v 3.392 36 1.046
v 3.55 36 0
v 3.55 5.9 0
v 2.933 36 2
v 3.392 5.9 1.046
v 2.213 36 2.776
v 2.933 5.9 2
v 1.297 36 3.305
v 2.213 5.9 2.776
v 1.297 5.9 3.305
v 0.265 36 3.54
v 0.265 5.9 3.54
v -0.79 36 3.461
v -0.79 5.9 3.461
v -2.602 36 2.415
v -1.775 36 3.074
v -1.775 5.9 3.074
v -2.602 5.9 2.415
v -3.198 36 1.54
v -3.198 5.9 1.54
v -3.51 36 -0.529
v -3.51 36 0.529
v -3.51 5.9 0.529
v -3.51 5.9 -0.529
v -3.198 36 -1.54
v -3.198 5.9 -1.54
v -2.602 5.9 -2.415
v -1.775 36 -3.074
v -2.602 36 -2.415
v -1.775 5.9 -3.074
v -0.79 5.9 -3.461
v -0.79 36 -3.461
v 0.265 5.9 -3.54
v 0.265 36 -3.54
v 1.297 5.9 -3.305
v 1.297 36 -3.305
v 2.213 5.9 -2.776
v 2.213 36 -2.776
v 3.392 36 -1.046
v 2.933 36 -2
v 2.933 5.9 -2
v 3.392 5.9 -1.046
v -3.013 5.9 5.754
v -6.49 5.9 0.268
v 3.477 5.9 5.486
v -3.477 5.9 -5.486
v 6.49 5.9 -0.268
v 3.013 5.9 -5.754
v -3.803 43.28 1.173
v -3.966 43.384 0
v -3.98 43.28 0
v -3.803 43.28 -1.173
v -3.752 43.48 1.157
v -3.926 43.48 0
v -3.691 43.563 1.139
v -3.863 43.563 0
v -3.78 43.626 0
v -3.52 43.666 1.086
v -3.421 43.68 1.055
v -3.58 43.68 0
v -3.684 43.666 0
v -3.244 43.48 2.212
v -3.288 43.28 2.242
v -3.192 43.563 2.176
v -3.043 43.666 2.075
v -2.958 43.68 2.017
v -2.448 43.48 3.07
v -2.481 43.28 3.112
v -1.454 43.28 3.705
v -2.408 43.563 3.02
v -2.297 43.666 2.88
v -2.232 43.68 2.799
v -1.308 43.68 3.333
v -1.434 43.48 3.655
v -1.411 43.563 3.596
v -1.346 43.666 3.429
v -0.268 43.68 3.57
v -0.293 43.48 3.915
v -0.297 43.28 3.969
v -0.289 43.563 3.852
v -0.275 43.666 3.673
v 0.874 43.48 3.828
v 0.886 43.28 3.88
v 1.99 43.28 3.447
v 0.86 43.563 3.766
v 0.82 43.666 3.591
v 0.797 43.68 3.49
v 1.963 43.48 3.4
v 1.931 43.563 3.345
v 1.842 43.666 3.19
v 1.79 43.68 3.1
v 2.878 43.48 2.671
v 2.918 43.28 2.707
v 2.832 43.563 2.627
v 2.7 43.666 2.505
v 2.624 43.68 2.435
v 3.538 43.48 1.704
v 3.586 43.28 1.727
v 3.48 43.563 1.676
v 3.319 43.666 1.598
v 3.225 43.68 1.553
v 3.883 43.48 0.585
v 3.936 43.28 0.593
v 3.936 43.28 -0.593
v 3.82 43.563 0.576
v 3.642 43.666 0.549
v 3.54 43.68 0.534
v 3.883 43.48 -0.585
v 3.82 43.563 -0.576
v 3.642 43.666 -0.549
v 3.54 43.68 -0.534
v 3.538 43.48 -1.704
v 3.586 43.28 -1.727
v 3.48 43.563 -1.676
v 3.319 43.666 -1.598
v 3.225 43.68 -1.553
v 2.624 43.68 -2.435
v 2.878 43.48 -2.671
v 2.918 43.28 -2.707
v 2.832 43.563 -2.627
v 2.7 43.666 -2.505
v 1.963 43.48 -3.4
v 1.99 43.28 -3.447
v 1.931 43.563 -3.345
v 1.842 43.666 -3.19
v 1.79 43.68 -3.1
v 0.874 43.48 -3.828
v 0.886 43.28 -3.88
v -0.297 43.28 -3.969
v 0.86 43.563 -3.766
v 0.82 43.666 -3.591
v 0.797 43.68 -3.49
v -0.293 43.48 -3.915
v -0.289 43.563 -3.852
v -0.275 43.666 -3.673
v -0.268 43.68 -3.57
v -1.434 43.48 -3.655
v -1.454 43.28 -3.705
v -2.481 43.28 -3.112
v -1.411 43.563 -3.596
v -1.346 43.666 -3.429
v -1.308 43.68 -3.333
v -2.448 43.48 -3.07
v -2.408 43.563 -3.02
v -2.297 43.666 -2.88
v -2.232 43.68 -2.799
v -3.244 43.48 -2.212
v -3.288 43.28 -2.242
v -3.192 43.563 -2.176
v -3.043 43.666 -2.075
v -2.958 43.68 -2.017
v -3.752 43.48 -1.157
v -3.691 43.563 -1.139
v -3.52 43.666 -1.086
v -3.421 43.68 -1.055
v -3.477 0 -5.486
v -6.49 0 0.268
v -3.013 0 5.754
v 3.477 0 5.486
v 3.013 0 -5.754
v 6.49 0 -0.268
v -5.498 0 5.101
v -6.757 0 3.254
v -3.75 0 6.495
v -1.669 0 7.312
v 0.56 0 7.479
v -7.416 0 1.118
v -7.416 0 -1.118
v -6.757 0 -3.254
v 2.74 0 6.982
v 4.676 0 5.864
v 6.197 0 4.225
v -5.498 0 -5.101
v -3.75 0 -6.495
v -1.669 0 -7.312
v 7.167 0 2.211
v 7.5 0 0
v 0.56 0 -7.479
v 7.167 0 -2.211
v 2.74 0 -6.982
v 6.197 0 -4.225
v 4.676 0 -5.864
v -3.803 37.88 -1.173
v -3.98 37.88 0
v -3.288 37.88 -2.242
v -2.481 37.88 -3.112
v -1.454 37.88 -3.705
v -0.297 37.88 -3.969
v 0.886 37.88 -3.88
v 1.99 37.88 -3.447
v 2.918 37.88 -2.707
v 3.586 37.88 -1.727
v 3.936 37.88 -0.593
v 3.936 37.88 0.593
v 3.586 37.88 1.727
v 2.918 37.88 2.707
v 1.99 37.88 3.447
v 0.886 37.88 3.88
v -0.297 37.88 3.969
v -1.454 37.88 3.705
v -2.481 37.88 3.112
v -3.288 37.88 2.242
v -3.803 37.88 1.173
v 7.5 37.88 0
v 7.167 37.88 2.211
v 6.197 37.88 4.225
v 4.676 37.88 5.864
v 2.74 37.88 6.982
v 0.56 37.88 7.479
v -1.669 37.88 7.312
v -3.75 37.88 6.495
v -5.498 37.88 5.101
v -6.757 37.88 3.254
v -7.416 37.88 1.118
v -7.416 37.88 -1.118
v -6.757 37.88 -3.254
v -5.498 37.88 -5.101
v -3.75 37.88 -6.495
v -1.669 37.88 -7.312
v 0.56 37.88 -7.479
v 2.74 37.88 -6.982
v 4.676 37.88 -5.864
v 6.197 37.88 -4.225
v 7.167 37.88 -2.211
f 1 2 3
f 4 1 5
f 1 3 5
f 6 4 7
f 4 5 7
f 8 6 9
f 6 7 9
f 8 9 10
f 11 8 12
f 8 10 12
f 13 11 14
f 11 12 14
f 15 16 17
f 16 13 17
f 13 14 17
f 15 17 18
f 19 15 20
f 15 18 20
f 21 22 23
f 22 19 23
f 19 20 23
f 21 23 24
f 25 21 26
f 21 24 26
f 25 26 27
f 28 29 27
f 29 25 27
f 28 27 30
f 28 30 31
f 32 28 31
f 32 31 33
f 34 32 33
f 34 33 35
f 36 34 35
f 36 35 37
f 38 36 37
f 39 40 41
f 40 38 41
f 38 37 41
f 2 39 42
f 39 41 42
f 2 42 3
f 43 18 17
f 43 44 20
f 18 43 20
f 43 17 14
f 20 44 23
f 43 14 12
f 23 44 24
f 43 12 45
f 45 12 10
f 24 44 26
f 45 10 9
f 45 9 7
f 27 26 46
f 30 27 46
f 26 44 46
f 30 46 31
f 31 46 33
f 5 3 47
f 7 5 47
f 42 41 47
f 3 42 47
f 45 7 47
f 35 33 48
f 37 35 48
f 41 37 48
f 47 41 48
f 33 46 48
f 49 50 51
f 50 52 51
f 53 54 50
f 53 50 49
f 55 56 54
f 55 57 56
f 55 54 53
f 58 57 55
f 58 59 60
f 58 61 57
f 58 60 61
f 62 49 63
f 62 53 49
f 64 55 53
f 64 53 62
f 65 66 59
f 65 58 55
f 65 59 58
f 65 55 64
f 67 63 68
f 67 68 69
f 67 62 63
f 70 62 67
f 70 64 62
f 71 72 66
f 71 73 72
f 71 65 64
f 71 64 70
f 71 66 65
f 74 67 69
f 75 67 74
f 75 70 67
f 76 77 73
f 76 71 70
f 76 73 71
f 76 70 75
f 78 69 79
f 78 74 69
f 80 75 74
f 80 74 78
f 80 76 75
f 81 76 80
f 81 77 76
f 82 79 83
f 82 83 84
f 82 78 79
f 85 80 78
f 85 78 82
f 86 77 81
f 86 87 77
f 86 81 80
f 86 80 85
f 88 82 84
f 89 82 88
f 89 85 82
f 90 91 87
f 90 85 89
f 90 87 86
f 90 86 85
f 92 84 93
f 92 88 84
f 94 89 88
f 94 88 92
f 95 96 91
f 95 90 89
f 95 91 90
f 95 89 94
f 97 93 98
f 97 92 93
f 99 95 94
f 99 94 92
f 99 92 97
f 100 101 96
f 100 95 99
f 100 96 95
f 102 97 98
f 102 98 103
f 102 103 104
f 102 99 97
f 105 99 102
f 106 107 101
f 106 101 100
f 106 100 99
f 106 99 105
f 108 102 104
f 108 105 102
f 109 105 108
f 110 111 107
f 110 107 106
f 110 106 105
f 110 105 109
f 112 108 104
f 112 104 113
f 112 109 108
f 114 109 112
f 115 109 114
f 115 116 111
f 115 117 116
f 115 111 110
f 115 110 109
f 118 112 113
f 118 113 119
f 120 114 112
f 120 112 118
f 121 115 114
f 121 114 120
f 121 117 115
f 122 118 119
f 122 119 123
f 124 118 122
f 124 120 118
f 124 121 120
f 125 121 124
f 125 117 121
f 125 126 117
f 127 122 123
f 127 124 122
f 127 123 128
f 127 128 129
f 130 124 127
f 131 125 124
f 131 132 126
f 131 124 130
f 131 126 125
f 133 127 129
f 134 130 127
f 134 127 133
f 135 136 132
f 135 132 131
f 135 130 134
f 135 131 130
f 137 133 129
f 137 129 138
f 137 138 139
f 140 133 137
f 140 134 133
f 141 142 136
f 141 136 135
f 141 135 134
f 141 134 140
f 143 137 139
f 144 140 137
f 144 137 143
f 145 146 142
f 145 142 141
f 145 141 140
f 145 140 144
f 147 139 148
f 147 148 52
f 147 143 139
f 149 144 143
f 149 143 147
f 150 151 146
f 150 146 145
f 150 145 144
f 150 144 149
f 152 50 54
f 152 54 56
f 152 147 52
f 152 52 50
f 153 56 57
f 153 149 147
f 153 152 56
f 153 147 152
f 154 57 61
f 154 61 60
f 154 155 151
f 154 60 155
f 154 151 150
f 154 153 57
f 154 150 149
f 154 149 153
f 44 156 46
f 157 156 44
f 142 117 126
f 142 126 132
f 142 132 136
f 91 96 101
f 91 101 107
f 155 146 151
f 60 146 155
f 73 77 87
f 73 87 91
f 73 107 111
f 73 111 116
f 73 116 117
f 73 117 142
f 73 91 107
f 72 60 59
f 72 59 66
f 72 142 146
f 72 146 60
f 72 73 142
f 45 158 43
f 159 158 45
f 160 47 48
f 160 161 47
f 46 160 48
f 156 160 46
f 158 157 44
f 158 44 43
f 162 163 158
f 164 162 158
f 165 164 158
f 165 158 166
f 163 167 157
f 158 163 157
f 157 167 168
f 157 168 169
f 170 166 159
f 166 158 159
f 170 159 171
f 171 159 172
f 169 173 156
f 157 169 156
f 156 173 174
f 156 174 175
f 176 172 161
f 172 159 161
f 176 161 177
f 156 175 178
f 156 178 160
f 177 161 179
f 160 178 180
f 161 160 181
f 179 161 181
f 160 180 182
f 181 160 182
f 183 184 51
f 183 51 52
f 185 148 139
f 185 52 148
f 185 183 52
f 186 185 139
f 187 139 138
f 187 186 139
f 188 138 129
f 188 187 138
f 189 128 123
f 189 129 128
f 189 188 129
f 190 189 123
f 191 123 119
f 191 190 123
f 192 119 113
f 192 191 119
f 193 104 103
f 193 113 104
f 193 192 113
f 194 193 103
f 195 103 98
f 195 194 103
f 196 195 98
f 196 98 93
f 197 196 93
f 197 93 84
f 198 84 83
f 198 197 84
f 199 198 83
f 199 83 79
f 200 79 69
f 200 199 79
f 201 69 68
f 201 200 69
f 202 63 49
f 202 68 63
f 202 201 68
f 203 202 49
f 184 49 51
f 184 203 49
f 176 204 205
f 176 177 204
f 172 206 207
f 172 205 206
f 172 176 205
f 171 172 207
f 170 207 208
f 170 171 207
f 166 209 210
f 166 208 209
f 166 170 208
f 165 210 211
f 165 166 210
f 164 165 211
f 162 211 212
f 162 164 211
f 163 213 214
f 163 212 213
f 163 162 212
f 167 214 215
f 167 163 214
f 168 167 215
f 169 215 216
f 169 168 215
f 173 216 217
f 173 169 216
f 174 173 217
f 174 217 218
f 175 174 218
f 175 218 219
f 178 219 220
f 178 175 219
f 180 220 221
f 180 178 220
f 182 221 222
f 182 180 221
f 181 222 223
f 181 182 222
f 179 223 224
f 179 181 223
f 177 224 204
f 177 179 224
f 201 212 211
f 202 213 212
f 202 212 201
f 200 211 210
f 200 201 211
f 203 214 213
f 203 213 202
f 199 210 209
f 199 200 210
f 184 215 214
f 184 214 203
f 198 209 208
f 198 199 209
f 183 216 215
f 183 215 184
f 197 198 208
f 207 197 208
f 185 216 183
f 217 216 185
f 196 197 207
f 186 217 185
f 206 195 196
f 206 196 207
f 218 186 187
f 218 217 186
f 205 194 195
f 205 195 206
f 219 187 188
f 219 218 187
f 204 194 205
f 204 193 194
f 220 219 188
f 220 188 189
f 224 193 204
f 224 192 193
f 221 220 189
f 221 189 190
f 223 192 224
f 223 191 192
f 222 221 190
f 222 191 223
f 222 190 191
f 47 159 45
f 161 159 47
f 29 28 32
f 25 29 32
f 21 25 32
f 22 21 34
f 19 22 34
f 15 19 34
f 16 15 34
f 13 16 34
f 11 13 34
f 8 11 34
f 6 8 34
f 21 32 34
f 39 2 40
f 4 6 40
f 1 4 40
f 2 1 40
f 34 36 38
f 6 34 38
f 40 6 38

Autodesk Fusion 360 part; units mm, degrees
sketch "Sketch1" plane through (0, 0, 0) normal (0, 1, 0) x (1, 0, 0)
  circle A0 centre (0, 0) radius 7.5
  line L0 (6.4897, 0.2677) -> (3.013, 5.7541)
  line L1 (3.013, 5.7541) -> (-3.4767, 5.4864)
  line L2 (-3.4767, 5.4864) -> (-6.4897, -0.2677)
  line L3 (-6.4897, -0.2677) -> (-3.013, -5.7541)
  line L4 (-3.013, -5.7541) -> (3.4767, -5.4864)
  line L5 (3.4767, -5.4864) -> (6.4897, 0.2677)
  circle A1 centre (0, 0) radius 3.55
  dimension "d1" = 15
  dimension "d2" = 5.625
  dimension "d7" = 7.1
extrude "Extrude1" add sketch "Sketch1" along normal blind 37.88 contours A0 | L0 L1 L2 L3 L4 L5 | A1
extrude "Extrude2" cut sketch "Sketch1" along normal blind 5.9 contours L0 L1 L2 L3 L4 L5 | A1
extrude "Extrude3" cut sketch "Sketch1" along normal blind 36 contours A1
sketch "Sketch2" plane through (0, 37.88, 0) normal (0, 1, 0) x (-1, 0, 0)
  circle A0 centre (0, 0) radius 7.5
  circle A1 centre (0, 0) radius 3.98
  dimension "d10" = 7.96
extrude "Extrude4" add sketch "Sketch2" along normal blind 5.8 contours A1
fillet "Fillet1" radius 0.4 1 edges at (3.7107, 43.68, -1.4392)
